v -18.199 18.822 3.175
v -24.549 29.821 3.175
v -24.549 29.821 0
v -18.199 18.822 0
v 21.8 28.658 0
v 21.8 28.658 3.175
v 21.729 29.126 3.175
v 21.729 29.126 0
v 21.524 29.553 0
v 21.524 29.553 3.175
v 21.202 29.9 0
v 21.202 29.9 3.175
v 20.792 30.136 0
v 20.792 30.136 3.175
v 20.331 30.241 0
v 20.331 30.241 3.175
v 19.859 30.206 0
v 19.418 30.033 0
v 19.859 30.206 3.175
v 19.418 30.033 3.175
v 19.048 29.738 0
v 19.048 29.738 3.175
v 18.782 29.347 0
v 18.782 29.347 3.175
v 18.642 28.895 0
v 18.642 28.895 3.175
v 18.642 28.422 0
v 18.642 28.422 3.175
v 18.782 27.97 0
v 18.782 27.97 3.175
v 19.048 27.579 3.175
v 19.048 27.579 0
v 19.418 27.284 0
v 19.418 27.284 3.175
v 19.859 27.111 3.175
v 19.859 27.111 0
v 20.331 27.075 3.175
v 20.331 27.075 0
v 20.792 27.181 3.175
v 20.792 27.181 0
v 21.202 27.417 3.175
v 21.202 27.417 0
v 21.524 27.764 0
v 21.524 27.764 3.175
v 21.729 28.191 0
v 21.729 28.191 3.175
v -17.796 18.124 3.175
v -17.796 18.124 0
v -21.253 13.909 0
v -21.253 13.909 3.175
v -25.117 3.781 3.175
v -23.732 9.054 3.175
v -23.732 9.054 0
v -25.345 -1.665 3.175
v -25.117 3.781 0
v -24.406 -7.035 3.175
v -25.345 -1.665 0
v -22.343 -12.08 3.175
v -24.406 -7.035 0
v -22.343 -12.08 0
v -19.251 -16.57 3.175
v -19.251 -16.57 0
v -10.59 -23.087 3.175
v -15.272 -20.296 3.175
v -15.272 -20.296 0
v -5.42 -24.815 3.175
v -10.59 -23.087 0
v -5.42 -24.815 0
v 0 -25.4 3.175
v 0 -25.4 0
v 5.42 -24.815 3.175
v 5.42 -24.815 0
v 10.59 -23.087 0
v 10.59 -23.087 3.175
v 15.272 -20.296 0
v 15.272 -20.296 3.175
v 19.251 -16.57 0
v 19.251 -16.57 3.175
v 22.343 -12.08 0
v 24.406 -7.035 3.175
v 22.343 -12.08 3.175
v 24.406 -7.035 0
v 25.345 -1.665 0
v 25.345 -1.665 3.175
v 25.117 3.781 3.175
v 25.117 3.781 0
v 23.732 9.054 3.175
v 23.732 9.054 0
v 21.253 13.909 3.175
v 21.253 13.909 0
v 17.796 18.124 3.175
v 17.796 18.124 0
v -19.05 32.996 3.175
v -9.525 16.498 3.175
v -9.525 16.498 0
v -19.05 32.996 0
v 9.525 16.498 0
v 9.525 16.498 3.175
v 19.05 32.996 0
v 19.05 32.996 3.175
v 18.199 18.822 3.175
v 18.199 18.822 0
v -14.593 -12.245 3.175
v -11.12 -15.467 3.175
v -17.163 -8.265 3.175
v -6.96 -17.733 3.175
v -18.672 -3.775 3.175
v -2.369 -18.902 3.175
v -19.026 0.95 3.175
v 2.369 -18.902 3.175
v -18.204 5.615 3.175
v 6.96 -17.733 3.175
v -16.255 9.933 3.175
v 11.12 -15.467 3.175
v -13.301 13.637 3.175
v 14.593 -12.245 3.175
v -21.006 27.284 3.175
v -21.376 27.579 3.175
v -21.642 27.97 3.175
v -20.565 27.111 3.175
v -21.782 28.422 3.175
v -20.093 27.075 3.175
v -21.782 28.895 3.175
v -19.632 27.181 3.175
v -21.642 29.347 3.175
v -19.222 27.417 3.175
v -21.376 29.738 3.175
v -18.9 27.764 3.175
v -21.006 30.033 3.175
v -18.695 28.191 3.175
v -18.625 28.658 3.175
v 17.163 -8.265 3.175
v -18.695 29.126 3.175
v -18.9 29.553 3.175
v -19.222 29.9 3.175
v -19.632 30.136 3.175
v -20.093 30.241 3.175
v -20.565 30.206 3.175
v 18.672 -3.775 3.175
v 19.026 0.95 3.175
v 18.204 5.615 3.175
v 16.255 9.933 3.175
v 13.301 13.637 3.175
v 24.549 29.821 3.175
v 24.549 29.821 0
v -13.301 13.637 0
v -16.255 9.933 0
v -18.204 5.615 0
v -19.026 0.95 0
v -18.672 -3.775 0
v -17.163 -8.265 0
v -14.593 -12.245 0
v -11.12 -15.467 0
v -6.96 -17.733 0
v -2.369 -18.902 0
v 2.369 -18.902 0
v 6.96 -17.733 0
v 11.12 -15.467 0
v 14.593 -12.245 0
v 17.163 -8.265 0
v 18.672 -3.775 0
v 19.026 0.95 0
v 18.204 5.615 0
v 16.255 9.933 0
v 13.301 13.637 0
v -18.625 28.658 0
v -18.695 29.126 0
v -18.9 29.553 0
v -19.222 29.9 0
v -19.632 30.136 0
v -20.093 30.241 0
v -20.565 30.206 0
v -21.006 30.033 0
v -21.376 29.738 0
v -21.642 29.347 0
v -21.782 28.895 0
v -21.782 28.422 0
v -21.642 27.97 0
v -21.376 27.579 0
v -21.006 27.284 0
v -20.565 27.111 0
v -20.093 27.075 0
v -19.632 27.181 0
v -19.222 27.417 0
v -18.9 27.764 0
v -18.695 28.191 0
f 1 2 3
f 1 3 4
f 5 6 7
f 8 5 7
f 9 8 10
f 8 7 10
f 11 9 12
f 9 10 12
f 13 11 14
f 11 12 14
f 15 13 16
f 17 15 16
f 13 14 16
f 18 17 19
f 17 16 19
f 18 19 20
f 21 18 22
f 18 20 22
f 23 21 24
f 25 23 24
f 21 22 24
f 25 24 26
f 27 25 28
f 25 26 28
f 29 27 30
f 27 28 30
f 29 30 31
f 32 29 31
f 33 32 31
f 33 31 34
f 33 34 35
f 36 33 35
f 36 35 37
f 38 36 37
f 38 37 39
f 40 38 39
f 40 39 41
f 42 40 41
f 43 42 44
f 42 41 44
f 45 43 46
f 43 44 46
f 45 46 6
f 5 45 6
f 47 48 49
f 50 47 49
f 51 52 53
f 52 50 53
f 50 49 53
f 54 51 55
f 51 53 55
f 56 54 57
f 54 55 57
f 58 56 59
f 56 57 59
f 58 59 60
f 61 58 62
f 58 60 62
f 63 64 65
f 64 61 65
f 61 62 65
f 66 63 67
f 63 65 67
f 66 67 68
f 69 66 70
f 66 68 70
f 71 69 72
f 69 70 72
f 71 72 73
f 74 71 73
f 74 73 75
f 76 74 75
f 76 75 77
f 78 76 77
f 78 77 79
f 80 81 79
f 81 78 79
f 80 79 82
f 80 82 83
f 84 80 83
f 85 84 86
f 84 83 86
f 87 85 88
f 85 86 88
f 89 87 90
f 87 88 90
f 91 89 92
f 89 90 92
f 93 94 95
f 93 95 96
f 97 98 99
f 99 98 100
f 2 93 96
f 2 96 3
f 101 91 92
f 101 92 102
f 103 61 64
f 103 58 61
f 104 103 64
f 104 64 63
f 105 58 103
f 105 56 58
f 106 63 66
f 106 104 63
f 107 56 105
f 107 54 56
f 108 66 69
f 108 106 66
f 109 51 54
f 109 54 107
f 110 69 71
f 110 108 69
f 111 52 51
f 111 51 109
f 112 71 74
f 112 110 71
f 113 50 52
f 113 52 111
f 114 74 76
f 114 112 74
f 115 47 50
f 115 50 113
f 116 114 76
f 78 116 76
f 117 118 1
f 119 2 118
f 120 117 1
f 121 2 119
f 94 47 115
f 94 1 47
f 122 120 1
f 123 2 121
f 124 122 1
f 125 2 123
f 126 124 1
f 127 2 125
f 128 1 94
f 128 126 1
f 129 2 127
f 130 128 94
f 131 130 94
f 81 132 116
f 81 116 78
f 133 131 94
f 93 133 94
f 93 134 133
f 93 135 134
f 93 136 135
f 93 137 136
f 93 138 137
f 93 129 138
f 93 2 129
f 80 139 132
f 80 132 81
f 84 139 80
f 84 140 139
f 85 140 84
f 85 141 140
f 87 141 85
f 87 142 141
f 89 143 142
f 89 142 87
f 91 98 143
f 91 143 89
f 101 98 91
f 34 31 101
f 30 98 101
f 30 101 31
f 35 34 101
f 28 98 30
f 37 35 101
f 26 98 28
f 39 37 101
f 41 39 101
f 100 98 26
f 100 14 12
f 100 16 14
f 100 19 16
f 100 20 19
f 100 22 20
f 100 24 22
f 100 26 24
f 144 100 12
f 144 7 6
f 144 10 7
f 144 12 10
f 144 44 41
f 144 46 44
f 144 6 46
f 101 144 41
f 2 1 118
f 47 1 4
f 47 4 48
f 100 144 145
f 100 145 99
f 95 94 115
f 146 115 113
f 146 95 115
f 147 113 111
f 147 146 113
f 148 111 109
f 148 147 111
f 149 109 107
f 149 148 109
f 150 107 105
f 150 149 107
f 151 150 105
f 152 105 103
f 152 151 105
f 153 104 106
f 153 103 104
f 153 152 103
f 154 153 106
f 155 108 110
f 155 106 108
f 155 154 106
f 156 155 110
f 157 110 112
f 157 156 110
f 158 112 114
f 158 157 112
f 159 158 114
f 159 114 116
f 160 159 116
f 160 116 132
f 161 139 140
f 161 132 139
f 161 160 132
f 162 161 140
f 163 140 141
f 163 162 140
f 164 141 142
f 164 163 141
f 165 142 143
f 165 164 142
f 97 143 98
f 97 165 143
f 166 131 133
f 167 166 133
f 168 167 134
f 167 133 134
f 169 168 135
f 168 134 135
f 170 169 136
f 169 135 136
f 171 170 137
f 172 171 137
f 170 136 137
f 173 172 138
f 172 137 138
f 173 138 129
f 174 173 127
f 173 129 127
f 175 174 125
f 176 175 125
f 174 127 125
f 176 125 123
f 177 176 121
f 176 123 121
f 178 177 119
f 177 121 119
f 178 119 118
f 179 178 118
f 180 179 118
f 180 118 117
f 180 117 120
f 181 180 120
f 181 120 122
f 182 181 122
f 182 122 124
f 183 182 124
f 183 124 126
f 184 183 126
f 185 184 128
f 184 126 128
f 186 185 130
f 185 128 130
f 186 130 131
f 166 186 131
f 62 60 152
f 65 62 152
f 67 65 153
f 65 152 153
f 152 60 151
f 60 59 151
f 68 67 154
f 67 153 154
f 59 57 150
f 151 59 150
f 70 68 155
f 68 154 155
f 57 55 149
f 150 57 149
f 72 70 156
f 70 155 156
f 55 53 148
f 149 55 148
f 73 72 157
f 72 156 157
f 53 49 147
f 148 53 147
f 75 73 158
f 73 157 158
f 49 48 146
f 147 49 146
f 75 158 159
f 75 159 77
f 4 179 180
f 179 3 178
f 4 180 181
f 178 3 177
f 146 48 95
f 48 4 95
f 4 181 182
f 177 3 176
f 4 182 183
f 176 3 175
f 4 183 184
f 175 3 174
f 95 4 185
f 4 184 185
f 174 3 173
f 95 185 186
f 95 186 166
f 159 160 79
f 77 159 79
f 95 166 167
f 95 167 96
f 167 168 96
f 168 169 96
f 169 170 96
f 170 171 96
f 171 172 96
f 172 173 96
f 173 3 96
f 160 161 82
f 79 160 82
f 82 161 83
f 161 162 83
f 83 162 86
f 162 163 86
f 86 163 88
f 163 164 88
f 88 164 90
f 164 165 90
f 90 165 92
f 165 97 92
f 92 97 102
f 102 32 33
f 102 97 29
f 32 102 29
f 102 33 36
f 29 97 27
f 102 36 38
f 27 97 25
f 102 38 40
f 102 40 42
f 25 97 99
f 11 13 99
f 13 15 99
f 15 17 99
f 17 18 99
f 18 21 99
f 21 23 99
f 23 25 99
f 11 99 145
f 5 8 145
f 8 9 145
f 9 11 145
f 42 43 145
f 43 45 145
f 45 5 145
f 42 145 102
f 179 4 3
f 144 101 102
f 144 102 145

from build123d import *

# Parameters (mm, degrees)
SKETCH2_R           = 25.4
SKETCH2_R_2         = 22.225
SKETCH2_R_3         = 19.05
BOSS_EXTRUDE1_DEPTH = 3.175
SKETCH3_R           = 1.5875
BOSS_EXTRUDE2_DEPTH = 3.175
CUT_EXTRUDE1_DEPTH  = 3.175


with BuildPart() as part:
    # Sketch2 → Boss-Extrude1 (new body)
    with BuildSketch(Plane.XY):
        Circle(SKETCH2_R)
        Circle(SKETCH2_R_2, mode=Mode.SUBTRACT)
        Circle(SKETCH2_R_2)
        Circle(SKETCH2_R_3, mode=Mode.SUBTRACT)
    extrude(amount=BOSS_EXTRUDE1_DEPTH)

    # Sketch3 → Boss-Extrude2 (add)
    with BuildSketch(Plane.XY.offset(3.175)):
        with BuildLine():
            ThreePointArc((-17.795983438, 18.123547486), (-15.370499267, 20.22146761), (-12.7, 21.997045256))
            Line((-12.7, 21.997045256), (-19.05, 32.995567884))
            Line((-19.05, 32.995567884), (-24.549261314, 29.820567884))
            Line((-24.549261314, 29.820567884), (-18.199261314, 18.822045256))
            Line((-18.199261314, 18.822045256), (-17.795983438, 18.123547486))
        make_face()
        with Locations((-20.212130657, 28.658437227)):
            Circle(SKETCH3_R, mode=Mode.SUBTRACT)
        with BuildLine():
            Line((19.05, 32.995567884), (12.7, 21.997045256))
            ThreePointArc((12.7, 21.997045256), (15.370499267, 20.22146761), (17.795983438, 18.123547486))
            Line((17.795983438, 18.123547486), (18.199261314, 18.822045256))
            Line((18.199261314, 18.822045256), (24.549261314, 29.820567884))
            Line((24.549261314, 29.820567884), (19.05, 32.995567884))
        make_face()
        with Locations((20.212130657, 28.658437227)):
            Circle(SKETCH3_R, mode=Mode.SUBTRACT)
    extrude(amount=-BOSS_EXTRUDE2_DEPTH)

    # Sketch5 → Cut-Extrude1 (cut)
    with BuildSketch(Plane.XY.offset(3.175)):
        with BuildLine():
            Line((-12.7, 21.997045256), (0, 0))
            Line((0, 0), (12.7, 21.997045256))
            ThreePointArc((12.7, 21.997045256), (0, 25.4), (-12.7, 21.997045256))
        make_face()
    extrude(amount=-CUT_EXTRUDE1_DEPTH, mode=Mode.SUBTRACT)


solid = part.part
